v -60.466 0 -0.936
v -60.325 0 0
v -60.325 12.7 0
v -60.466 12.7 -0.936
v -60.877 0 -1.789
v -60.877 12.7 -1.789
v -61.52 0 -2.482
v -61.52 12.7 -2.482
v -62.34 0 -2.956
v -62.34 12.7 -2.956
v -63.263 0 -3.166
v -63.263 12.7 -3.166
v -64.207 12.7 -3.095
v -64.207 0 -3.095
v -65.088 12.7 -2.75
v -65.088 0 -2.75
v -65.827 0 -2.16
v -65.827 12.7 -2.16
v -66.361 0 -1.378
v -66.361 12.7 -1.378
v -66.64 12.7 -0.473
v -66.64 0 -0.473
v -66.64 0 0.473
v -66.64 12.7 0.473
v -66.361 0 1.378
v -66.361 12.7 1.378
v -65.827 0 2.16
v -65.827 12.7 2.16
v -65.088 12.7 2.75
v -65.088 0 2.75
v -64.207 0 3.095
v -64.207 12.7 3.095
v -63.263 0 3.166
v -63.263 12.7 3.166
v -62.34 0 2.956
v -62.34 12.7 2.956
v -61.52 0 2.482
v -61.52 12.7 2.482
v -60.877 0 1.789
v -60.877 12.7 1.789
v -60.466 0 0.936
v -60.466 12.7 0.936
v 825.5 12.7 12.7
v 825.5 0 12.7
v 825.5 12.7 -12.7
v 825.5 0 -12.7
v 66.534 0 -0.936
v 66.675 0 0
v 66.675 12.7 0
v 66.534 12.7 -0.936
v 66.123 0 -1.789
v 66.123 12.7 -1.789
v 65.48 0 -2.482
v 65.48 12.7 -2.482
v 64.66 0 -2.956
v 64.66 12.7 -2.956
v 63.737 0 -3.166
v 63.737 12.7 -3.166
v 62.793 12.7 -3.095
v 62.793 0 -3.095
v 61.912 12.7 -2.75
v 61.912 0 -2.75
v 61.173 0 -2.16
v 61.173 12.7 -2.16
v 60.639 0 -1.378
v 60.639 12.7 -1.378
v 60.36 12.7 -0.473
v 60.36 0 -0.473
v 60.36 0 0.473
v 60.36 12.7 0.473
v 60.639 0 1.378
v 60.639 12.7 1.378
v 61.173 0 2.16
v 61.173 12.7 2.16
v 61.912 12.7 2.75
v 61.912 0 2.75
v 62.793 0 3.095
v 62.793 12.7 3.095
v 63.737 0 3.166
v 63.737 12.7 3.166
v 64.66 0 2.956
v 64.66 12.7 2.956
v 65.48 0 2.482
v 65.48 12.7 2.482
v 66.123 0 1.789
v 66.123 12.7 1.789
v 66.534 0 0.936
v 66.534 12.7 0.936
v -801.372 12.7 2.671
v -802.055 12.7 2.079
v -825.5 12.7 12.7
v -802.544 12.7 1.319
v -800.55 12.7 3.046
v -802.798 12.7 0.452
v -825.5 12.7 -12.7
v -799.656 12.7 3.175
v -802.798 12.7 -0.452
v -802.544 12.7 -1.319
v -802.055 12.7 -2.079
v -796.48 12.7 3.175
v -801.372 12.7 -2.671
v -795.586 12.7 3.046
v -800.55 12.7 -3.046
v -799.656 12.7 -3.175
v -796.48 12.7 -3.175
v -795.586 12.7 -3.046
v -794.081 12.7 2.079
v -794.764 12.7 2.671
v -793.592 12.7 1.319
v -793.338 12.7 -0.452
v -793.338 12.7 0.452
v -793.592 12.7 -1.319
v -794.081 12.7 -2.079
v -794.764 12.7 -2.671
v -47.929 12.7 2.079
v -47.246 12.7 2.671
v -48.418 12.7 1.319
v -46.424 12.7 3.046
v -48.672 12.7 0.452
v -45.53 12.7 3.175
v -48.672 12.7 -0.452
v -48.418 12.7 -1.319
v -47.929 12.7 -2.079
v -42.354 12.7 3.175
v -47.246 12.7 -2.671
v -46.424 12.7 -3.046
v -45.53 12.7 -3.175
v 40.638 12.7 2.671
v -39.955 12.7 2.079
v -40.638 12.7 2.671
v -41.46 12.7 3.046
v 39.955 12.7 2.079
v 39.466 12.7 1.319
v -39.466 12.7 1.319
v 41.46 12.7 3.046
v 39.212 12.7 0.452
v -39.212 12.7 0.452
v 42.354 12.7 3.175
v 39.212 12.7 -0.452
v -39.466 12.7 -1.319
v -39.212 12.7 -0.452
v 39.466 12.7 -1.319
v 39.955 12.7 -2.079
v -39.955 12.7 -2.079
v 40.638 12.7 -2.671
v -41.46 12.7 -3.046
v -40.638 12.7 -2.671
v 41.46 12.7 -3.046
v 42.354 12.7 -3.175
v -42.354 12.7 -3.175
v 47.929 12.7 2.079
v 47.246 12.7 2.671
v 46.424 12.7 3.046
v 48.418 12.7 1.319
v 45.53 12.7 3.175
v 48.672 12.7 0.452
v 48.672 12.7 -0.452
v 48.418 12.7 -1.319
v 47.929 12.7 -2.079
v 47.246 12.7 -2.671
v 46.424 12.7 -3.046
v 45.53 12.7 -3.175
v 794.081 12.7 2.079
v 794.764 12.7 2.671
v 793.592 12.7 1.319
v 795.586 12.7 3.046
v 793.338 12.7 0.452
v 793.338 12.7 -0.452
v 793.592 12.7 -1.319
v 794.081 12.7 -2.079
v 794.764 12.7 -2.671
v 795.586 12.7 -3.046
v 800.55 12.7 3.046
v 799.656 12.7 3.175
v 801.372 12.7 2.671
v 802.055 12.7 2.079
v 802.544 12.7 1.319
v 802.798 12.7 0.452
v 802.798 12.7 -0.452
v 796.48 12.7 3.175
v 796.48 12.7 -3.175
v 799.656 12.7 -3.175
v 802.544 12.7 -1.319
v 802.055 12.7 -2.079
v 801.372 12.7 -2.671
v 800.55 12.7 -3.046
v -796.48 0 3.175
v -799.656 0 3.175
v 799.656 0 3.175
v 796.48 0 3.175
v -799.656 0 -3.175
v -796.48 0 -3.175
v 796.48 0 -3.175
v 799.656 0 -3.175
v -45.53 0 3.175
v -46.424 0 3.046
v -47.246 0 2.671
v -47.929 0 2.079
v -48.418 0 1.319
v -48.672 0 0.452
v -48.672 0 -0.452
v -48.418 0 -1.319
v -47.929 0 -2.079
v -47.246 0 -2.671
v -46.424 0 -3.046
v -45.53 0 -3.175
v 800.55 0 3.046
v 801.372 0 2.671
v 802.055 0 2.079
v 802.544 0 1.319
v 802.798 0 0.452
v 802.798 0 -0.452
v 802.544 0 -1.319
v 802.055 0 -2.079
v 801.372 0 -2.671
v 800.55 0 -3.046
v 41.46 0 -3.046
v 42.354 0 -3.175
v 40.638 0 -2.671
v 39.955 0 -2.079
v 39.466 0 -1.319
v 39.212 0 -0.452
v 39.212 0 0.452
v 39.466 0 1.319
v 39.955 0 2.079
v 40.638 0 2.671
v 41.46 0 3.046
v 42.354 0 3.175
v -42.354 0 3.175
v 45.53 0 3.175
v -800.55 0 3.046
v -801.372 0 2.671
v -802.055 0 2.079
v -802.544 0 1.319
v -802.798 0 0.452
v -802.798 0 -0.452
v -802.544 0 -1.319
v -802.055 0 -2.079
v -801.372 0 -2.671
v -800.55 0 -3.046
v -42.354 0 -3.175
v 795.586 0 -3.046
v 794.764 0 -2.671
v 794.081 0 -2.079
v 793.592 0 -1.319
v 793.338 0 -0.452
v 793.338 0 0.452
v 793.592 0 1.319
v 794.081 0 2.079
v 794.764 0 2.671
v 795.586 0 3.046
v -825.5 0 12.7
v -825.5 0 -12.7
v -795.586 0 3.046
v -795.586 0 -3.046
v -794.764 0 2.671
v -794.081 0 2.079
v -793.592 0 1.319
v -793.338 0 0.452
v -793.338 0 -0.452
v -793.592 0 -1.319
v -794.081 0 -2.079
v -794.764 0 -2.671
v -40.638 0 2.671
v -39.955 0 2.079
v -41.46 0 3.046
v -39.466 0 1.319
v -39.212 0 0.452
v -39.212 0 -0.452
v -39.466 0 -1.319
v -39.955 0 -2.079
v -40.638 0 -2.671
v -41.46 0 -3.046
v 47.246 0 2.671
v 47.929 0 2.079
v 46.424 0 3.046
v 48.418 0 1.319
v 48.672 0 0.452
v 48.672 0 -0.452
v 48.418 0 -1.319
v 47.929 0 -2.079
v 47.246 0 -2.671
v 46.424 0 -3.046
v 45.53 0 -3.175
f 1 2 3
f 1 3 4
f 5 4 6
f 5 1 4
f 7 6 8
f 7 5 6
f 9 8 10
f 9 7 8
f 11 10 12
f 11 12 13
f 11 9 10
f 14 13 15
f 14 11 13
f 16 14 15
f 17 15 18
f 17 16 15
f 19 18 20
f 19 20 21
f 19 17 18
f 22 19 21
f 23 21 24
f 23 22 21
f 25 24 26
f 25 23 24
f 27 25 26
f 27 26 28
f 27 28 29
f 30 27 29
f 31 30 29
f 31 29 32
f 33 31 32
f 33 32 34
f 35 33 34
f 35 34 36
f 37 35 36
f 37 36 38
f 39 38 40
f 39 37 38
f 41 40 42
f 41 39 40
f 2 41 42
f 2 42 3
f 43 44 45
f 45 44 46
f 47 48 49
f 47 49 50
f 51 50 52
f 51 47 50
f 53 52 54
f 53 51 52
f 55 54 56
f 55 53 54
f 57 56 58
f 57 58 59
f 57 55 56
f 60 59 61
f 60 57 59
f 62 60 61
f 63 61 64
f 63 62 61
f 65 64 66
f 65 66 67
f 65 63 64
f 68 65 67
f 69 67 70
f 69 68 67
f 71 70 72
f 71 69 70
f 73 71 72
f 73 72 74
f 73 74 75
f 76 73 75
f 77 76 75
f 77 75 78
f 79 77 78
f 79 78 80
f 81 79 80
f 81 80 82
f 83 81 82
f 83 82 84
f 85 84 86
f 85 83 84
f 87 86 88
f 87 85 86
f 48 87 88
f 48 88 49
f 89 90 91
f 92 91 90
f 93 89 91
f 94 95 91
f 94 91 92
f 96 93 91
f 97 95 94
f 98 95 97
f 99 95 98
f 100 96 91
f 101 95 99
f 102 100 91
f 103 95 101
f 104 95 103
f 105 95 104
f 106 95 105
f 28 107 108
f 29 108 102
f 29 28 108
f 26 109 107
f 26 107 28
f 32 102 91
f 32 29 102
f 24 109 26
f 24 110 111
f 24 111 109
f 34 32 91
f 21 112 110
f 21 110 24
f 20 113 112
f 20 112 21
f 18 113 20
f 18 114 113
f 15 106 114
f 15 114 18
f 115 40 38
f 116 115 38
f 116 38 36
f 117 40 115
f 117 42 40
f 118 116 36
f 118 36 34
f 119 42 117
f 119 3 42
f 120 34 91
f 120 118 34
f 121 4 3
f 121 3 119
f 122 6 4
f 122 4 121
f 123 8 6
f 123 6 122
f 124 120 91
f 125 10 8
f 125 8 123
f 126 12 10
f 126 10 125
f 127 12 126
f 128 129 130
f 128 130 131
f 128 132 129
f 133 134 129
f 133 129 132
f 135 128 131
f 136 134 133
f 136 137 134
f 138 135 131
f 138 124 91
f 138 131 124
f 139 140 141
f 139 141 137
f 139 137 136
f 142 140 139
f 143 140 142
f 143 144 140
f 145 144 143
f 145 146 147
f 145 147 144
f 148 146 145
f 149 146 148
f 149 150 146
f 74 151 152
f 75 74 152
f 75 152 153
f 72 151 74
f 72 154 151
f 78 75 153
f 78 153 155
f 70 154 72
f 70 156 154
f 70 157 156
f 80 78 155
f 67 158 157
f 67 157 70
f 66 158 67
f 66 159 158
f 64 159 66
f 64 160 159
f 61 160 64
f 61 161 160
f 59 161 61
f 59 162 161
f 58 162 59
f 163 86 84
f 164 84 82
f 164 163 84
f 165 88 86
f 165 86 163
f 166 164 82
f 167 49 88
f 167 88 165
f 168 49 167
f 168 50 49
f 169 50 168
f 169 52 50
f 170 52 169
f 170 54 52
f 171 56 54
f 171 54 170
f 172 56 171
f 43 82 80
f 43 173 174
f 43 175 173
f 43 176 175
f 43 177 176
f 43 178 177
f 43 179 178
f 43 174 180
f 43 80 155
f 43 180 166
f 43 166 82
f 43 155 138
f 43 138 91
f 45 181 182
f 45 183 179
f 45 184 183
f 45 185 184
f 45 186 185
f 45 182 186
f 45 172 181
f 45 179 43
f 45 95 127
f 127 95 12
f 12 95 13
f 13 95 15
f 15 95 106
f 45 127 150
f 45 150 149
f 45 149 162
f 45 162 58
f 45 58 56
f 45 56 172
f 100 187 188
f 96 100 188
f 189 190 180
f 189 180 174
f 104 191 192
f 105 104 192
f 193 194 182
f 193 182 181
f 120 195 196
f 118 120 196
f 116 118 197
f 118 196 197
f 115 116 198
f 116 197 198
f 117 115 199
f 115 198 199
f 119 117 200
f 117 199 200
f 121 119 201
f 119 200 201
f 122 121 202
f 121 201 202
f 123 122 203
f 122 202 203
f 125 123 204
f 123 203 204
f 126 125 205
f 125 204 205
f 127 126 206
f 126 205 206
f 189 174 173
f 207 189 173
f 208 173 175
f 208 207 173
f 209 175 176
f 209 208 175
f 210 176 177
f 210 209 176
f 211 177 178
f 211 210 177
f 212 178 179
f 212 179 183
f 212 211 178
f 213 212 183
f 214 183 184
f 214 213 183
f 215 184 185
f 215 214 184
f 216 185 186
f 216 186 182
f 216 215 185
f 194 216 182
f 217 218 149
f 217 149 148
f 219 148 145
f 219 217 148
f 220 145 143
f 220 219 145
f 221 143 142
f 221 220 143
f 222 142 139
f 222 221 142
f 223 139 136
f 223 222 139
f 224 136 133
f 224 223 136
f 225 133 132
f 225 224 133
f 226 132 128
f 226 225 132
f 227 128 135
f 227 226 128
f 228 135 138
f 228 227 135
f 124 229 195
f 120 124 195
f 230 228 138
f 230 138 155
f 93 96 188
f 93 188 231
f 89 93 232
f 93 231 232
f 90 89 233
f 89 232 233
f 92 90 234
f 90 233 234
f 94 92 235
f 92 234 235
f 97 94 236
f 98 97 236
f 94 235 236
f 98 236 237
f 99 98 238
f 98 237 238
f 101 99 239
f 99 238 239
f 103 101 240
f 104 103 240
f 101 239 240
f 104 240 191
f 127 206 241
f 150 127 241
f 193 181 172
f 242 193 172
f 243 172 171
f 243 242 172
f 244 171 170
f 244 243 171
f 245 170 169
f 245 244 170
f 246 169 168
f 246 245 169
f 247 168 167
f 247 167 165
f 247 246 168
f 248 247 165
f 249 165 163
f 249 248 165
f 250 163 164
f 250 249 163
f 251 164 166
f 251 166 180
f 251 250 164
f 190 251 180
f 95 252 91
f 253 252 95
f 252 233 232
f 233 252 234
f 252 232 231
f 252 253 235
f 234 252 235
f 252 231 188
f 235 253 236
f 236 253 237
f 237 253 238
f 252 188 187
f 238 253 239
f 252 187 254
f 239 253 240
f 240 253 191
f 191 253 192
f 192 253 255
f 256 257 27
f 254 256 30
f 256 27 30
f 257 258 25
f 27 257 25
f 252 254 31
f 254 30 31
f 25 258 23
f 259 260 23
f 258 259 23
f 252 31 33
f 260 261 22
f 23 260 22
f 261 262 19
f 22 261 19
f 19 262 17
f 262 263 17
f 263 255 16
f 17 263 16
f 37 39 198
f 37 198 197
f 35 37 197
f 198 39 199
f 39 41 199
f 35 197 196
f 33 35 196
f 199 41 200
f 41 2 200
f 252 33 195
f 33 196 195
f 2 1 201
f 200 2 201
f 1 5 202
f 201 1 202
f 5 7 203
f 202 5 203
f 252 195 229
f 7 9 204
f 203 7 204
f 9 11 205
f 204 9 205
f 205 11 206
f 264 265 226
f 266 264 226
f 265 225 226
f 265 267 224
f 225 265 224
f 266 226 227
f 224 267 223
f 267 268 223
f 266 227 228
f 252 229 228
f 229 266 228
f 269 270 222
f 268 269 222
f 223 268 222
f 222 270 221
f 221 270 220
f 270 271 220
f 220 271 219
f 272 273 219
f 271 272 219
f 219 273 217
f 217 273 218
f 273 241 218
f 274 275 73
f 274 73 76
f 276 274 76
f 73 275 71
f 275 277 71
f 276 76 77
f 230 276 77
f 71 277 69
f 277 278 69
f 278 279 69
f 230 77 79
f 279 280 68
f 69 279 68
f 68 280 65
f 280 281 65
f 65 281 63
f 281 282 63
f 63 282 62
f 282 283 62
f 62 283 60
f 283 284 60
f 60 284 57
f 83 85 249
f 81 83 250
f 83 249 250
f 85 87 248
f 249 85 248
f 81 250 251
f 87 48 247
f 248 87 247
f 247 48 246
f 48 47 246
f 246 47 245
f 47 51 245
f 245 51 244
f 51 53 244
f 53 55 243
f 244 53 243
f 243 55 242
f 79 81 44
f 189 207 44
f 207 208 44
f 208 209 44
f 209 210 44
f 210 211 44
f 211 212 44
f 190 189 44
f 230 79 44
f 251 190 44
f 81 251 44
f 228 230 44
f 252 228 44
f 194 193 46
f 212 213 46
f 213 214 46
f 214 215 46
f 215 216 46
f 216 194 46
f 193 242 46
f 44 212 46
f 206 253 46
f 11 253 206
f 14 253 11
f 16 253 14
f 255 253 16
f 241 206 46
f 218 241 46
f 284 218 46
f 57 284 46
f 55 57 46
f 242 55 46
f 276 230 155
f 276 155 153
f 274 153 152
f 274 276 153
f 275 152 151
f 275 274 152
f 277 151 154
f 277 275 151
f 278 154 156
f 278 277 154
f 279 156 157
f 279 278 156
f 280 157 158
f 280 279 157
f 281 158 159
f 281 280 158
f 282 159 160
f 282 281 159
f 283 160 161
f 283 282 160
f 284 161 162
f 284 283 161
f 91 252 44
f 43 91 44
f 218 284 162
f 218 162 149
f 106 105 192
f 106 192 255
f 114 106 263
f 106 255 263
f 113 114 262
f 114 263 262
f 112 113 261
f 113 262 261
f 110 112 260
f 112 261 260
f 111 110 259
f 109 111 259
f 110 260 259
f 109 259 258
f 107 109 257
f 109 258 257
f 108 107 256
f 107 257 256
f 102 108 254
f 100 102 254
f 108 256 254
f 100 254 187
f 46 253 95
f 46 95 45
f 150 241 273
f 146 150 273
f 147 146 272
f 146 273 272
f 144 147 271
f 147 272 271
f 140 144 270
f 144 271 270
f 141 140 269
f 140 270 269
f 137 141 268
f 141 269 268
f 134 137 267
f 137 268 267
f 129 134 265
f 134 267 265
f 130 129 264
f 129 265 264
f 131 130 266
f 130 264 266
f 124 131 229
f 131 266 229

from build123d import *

# Parameters (mm, degrees)
SKETCH1_W           = 1651
SKETCH1_H           = 25.4
SKETCH1_R           = 3.175
BOSS_EXTRUDE1_DEPTH = 12.7


with BuildPart() as part:
    # Sketch1 → Boss-Extrude1 (new body)
    with BuildSketch(Plane(origin=(0, 0, 0), x_dir=(1, 0, 0), z_dir=(0, 1, 0))):
        Rectangle(SKETCH1_W, SKETCH1_H)
        with Locations((63.5, 0)):
            Circle(SKETCH1_R, mode=Mode.SUBTRACT)
        with Locations((-63.5, 0)):
            Circle(SKETCH1_R, mode=Mode.SUBTRACT)
        with BuildLine():
            Line((-799.6555, 3.175), (-796.4805, 3.175))
            ThreePointArc((-796.4805, 3.175), (-793.3055, 0), (-796.4805, -3.175))
            Line((-796.4805, -3.175), (-799.6555, -3.175))
            ThreePointArc((-799.6555, -3.175), (-802.8305, 0), (-799.6555, 3.175))
        make_face(mode=Mode.SUBTRACT)
        with BuildLine():
            Line((-45.5295, 3.175), (-42.3545, 3.175))
            ThreePointArc((-42.3545, 3.175), (-39.1795, 0), (-42.3545, -3.175))
            Line((-42.3545, -3.175), (-45.5295, -3.175))
            ThreePointArc((-45.5295, -3.175), (-48.7045, 0), (-45.5295, 3.175))
        make_face(mode=Mode.SUBTRACT)
        with BuildLine():
            Line((45.5295, 3.175), (42.3545, 3.175))
            ThreePointArc((42.3545, 3.175), (39.1795, 0), (42.3545, -3.175))
            Line((42.3545, -3.175), (45.5295, -3.175))
            ThreePointArc((45.5295, -3.175), (48.7045, 0), (45.5295, 3.175))
        make_face(mode=Mode.SUBTRACT)
        with BuildLine():
            Line((799.6555, 3.175), (796.4805, 3.175))
            ThreePointArc((796.4805, 3.175), (793.3055, 0), (796.4805, -3.175))
            Line((796.4805, -3.175), (799.6555, -3.175))
            ThreePointArc((799.6555, -3.175), (802.8305, 0), (799.6555, 3.175))
        make_face(mode=Mode.SUBTRACT)
    extrude(amount=BOSS_EXTRUDE1_DEPTH)


solid = part.part
